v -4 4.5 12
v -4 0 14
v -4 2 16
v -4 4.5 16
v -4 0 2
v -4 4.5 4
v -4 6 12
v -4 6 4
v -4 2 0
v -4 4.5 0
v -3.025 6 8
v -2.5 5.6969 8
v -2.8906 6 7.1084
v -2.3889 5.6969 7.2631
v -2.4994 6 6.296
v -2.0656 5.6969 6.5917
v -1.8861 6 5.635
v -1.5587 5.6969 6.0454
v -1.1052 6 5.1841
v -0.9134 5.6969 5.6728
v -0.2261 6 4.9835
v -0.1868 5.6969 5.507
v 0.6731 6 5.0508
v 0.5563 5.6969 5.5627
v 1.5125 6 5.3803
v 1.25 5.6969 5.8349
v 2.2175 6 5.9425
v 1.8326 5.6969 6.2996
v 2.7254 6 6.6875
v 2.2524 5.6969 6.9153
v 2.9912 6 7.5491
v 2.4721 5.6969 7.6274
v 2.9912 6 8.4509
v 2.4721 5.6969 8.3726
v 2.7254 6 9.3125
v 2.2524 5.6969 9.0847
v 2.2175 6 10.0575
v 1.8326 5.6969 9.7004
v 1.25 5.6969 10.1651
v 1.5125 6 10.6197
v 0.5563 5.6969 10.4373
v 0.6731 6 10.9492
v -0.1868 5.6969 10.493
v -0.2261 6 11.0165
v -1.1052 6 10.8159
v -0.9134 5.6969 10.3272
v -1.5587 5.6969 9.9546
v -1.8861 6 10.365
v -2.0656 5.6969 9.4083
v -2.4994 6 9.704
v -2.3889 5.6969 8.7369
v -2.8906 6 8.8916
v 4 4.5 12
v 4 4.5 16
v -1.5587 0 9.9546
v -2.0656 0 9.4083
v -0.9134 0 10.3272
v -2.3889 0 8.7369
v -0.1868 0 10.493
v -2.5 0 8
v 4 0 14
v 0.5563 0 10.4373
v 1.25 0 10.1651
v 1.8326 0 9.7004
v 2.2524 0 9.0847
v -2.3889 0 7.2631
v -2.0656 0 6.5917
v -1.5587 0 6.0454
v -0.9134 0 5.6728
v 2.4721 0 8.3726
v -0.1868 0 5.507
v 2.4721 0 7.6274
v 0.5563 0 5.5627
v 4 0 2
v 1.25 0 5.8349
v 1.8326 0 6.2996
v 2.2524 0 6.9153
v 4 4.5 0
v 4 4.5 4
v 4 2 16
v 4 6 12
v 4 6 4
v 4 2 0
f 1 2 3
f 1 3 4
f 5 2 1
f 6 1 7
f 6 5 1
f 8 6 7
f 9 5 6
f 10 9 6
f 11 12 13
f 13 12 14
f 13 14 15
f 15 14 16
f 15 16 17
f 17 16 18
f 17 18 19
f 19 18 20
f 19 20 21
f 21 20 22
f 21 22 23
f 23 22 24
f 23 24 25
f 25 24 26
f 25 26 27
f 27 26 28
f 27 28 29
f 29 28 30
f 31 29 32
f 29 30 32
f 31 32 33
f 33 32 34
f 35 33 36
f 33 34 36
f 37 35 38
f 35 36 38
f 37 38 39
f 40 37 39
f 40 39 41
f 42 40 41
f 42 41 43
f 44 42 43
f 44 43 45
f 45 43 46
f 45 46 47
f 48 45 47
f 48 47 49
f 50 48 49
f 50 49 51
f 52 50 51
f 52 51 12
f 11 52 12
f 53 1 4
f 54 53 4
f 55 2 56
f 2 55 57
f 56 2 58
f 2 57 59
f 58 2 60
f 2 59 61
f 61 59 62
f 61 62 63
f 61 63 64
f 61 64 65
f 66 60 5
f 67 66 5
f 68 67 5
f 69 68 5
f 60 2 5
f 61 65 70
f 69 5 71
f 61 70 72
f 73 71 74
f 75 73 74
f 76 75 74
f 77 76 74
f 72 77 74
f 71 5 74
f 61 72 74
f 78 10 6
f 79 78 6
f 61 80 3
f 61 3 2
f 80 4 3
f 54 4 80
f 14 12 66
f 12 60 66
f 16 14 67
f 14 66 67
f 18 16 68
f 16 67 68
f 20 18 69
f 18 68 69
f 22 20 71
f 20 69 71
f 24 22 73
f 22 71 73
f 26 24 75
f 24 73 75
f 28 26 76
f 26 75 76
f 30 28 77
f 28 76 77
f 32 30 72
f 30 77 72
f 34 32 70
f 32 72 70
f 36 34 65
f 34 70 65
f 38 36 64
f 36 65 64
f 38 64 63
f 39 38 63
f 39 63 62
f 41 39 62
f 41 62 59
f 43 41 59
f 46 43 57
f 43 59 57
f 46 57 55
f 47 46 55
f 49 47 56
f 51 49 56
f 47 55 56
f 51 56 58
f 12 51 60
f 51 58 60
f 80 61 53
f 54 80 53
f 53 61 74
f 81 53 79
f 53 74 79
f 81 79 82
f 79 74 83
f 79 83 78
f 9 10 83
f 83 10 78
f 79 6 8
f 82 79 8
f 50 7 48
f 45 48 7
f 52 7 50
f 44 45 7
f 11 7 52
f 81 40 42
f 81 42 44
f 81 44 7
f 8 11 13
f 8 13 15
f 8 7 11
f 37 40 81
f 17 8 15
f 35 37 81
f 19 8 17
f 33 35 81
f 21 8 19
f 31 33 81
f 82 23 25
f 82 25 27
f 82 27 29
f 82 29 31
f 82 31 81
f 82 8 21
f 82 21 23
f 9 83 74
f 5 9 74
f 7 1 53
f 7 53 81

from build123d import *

# Parameters (mm, degrees)
SCHIZZO1_W                      = 8
SCHIZZO1_H                      = 6
ESTRUSIONE_ESTRUSIONE1_DEPTH    = 16
FORO_FILETTATO_M6_1_D           = 5
FORO_FILETTATO_M6_1_CSINK_D     = 6.05
FORO_FILETTATO_M6_1_CSINK_ANGLE = 120
SCHIZZO4_W                      = 4
SCHIZZO4_H                      = 1.5
TAGLIO_ESTRUSIONE1_DEPTH        = 10


with BuildPart() as part:
    # Schizzo1 → Estrusione-Estrusione1 (new body)
    with BuildSketch(Plane.XY):
        with Locations((0, 3)):
            Rectangle(SCHIZZO1_W, SCHIZZO1_H)
    extrude(amount=ESTRUSIONE_ESTRUSIONE1_DEPTH)

    # Foro filettato M6-1 (through all)
    with Locations(Plane(origin=(0, 6, 0), x_dir=(1, 0, 0), z_dir=(0, 1, 0))):
        with Locations((0, -8)):
            CounterSinkHole(FORO_FILETTATO_M6_1_D / 2, FORO_FILETTATO_M6_1_CSINK_D / 2, counter_sink_angle=FORO_FILETTATO_M6_1_CSINK_ANGLE)

    # Schizzo4 → Taglio-Estrusione1 (cut)
    with BuildSketch(Plane.ZY.offset(4)):
        Polygon((0, 0), (0, 2), (2, 0), align=None)
        Polygon((16, 0), (16, 2), (14, 0), align=None)
        with Locations((14, 5.25)):
            Rectangle(SCHIZZO4_W, SCHIZZO4_H)
        with Locations((2, 5.25)):
            Rectangle(SCHIZZO4_W, SCHIZZO4_H)
    extrude(amount=-TAGLIO_ESTRUSIONE1_DEPTH, mode=Mode.SUBTRACT)


solid = part.part
